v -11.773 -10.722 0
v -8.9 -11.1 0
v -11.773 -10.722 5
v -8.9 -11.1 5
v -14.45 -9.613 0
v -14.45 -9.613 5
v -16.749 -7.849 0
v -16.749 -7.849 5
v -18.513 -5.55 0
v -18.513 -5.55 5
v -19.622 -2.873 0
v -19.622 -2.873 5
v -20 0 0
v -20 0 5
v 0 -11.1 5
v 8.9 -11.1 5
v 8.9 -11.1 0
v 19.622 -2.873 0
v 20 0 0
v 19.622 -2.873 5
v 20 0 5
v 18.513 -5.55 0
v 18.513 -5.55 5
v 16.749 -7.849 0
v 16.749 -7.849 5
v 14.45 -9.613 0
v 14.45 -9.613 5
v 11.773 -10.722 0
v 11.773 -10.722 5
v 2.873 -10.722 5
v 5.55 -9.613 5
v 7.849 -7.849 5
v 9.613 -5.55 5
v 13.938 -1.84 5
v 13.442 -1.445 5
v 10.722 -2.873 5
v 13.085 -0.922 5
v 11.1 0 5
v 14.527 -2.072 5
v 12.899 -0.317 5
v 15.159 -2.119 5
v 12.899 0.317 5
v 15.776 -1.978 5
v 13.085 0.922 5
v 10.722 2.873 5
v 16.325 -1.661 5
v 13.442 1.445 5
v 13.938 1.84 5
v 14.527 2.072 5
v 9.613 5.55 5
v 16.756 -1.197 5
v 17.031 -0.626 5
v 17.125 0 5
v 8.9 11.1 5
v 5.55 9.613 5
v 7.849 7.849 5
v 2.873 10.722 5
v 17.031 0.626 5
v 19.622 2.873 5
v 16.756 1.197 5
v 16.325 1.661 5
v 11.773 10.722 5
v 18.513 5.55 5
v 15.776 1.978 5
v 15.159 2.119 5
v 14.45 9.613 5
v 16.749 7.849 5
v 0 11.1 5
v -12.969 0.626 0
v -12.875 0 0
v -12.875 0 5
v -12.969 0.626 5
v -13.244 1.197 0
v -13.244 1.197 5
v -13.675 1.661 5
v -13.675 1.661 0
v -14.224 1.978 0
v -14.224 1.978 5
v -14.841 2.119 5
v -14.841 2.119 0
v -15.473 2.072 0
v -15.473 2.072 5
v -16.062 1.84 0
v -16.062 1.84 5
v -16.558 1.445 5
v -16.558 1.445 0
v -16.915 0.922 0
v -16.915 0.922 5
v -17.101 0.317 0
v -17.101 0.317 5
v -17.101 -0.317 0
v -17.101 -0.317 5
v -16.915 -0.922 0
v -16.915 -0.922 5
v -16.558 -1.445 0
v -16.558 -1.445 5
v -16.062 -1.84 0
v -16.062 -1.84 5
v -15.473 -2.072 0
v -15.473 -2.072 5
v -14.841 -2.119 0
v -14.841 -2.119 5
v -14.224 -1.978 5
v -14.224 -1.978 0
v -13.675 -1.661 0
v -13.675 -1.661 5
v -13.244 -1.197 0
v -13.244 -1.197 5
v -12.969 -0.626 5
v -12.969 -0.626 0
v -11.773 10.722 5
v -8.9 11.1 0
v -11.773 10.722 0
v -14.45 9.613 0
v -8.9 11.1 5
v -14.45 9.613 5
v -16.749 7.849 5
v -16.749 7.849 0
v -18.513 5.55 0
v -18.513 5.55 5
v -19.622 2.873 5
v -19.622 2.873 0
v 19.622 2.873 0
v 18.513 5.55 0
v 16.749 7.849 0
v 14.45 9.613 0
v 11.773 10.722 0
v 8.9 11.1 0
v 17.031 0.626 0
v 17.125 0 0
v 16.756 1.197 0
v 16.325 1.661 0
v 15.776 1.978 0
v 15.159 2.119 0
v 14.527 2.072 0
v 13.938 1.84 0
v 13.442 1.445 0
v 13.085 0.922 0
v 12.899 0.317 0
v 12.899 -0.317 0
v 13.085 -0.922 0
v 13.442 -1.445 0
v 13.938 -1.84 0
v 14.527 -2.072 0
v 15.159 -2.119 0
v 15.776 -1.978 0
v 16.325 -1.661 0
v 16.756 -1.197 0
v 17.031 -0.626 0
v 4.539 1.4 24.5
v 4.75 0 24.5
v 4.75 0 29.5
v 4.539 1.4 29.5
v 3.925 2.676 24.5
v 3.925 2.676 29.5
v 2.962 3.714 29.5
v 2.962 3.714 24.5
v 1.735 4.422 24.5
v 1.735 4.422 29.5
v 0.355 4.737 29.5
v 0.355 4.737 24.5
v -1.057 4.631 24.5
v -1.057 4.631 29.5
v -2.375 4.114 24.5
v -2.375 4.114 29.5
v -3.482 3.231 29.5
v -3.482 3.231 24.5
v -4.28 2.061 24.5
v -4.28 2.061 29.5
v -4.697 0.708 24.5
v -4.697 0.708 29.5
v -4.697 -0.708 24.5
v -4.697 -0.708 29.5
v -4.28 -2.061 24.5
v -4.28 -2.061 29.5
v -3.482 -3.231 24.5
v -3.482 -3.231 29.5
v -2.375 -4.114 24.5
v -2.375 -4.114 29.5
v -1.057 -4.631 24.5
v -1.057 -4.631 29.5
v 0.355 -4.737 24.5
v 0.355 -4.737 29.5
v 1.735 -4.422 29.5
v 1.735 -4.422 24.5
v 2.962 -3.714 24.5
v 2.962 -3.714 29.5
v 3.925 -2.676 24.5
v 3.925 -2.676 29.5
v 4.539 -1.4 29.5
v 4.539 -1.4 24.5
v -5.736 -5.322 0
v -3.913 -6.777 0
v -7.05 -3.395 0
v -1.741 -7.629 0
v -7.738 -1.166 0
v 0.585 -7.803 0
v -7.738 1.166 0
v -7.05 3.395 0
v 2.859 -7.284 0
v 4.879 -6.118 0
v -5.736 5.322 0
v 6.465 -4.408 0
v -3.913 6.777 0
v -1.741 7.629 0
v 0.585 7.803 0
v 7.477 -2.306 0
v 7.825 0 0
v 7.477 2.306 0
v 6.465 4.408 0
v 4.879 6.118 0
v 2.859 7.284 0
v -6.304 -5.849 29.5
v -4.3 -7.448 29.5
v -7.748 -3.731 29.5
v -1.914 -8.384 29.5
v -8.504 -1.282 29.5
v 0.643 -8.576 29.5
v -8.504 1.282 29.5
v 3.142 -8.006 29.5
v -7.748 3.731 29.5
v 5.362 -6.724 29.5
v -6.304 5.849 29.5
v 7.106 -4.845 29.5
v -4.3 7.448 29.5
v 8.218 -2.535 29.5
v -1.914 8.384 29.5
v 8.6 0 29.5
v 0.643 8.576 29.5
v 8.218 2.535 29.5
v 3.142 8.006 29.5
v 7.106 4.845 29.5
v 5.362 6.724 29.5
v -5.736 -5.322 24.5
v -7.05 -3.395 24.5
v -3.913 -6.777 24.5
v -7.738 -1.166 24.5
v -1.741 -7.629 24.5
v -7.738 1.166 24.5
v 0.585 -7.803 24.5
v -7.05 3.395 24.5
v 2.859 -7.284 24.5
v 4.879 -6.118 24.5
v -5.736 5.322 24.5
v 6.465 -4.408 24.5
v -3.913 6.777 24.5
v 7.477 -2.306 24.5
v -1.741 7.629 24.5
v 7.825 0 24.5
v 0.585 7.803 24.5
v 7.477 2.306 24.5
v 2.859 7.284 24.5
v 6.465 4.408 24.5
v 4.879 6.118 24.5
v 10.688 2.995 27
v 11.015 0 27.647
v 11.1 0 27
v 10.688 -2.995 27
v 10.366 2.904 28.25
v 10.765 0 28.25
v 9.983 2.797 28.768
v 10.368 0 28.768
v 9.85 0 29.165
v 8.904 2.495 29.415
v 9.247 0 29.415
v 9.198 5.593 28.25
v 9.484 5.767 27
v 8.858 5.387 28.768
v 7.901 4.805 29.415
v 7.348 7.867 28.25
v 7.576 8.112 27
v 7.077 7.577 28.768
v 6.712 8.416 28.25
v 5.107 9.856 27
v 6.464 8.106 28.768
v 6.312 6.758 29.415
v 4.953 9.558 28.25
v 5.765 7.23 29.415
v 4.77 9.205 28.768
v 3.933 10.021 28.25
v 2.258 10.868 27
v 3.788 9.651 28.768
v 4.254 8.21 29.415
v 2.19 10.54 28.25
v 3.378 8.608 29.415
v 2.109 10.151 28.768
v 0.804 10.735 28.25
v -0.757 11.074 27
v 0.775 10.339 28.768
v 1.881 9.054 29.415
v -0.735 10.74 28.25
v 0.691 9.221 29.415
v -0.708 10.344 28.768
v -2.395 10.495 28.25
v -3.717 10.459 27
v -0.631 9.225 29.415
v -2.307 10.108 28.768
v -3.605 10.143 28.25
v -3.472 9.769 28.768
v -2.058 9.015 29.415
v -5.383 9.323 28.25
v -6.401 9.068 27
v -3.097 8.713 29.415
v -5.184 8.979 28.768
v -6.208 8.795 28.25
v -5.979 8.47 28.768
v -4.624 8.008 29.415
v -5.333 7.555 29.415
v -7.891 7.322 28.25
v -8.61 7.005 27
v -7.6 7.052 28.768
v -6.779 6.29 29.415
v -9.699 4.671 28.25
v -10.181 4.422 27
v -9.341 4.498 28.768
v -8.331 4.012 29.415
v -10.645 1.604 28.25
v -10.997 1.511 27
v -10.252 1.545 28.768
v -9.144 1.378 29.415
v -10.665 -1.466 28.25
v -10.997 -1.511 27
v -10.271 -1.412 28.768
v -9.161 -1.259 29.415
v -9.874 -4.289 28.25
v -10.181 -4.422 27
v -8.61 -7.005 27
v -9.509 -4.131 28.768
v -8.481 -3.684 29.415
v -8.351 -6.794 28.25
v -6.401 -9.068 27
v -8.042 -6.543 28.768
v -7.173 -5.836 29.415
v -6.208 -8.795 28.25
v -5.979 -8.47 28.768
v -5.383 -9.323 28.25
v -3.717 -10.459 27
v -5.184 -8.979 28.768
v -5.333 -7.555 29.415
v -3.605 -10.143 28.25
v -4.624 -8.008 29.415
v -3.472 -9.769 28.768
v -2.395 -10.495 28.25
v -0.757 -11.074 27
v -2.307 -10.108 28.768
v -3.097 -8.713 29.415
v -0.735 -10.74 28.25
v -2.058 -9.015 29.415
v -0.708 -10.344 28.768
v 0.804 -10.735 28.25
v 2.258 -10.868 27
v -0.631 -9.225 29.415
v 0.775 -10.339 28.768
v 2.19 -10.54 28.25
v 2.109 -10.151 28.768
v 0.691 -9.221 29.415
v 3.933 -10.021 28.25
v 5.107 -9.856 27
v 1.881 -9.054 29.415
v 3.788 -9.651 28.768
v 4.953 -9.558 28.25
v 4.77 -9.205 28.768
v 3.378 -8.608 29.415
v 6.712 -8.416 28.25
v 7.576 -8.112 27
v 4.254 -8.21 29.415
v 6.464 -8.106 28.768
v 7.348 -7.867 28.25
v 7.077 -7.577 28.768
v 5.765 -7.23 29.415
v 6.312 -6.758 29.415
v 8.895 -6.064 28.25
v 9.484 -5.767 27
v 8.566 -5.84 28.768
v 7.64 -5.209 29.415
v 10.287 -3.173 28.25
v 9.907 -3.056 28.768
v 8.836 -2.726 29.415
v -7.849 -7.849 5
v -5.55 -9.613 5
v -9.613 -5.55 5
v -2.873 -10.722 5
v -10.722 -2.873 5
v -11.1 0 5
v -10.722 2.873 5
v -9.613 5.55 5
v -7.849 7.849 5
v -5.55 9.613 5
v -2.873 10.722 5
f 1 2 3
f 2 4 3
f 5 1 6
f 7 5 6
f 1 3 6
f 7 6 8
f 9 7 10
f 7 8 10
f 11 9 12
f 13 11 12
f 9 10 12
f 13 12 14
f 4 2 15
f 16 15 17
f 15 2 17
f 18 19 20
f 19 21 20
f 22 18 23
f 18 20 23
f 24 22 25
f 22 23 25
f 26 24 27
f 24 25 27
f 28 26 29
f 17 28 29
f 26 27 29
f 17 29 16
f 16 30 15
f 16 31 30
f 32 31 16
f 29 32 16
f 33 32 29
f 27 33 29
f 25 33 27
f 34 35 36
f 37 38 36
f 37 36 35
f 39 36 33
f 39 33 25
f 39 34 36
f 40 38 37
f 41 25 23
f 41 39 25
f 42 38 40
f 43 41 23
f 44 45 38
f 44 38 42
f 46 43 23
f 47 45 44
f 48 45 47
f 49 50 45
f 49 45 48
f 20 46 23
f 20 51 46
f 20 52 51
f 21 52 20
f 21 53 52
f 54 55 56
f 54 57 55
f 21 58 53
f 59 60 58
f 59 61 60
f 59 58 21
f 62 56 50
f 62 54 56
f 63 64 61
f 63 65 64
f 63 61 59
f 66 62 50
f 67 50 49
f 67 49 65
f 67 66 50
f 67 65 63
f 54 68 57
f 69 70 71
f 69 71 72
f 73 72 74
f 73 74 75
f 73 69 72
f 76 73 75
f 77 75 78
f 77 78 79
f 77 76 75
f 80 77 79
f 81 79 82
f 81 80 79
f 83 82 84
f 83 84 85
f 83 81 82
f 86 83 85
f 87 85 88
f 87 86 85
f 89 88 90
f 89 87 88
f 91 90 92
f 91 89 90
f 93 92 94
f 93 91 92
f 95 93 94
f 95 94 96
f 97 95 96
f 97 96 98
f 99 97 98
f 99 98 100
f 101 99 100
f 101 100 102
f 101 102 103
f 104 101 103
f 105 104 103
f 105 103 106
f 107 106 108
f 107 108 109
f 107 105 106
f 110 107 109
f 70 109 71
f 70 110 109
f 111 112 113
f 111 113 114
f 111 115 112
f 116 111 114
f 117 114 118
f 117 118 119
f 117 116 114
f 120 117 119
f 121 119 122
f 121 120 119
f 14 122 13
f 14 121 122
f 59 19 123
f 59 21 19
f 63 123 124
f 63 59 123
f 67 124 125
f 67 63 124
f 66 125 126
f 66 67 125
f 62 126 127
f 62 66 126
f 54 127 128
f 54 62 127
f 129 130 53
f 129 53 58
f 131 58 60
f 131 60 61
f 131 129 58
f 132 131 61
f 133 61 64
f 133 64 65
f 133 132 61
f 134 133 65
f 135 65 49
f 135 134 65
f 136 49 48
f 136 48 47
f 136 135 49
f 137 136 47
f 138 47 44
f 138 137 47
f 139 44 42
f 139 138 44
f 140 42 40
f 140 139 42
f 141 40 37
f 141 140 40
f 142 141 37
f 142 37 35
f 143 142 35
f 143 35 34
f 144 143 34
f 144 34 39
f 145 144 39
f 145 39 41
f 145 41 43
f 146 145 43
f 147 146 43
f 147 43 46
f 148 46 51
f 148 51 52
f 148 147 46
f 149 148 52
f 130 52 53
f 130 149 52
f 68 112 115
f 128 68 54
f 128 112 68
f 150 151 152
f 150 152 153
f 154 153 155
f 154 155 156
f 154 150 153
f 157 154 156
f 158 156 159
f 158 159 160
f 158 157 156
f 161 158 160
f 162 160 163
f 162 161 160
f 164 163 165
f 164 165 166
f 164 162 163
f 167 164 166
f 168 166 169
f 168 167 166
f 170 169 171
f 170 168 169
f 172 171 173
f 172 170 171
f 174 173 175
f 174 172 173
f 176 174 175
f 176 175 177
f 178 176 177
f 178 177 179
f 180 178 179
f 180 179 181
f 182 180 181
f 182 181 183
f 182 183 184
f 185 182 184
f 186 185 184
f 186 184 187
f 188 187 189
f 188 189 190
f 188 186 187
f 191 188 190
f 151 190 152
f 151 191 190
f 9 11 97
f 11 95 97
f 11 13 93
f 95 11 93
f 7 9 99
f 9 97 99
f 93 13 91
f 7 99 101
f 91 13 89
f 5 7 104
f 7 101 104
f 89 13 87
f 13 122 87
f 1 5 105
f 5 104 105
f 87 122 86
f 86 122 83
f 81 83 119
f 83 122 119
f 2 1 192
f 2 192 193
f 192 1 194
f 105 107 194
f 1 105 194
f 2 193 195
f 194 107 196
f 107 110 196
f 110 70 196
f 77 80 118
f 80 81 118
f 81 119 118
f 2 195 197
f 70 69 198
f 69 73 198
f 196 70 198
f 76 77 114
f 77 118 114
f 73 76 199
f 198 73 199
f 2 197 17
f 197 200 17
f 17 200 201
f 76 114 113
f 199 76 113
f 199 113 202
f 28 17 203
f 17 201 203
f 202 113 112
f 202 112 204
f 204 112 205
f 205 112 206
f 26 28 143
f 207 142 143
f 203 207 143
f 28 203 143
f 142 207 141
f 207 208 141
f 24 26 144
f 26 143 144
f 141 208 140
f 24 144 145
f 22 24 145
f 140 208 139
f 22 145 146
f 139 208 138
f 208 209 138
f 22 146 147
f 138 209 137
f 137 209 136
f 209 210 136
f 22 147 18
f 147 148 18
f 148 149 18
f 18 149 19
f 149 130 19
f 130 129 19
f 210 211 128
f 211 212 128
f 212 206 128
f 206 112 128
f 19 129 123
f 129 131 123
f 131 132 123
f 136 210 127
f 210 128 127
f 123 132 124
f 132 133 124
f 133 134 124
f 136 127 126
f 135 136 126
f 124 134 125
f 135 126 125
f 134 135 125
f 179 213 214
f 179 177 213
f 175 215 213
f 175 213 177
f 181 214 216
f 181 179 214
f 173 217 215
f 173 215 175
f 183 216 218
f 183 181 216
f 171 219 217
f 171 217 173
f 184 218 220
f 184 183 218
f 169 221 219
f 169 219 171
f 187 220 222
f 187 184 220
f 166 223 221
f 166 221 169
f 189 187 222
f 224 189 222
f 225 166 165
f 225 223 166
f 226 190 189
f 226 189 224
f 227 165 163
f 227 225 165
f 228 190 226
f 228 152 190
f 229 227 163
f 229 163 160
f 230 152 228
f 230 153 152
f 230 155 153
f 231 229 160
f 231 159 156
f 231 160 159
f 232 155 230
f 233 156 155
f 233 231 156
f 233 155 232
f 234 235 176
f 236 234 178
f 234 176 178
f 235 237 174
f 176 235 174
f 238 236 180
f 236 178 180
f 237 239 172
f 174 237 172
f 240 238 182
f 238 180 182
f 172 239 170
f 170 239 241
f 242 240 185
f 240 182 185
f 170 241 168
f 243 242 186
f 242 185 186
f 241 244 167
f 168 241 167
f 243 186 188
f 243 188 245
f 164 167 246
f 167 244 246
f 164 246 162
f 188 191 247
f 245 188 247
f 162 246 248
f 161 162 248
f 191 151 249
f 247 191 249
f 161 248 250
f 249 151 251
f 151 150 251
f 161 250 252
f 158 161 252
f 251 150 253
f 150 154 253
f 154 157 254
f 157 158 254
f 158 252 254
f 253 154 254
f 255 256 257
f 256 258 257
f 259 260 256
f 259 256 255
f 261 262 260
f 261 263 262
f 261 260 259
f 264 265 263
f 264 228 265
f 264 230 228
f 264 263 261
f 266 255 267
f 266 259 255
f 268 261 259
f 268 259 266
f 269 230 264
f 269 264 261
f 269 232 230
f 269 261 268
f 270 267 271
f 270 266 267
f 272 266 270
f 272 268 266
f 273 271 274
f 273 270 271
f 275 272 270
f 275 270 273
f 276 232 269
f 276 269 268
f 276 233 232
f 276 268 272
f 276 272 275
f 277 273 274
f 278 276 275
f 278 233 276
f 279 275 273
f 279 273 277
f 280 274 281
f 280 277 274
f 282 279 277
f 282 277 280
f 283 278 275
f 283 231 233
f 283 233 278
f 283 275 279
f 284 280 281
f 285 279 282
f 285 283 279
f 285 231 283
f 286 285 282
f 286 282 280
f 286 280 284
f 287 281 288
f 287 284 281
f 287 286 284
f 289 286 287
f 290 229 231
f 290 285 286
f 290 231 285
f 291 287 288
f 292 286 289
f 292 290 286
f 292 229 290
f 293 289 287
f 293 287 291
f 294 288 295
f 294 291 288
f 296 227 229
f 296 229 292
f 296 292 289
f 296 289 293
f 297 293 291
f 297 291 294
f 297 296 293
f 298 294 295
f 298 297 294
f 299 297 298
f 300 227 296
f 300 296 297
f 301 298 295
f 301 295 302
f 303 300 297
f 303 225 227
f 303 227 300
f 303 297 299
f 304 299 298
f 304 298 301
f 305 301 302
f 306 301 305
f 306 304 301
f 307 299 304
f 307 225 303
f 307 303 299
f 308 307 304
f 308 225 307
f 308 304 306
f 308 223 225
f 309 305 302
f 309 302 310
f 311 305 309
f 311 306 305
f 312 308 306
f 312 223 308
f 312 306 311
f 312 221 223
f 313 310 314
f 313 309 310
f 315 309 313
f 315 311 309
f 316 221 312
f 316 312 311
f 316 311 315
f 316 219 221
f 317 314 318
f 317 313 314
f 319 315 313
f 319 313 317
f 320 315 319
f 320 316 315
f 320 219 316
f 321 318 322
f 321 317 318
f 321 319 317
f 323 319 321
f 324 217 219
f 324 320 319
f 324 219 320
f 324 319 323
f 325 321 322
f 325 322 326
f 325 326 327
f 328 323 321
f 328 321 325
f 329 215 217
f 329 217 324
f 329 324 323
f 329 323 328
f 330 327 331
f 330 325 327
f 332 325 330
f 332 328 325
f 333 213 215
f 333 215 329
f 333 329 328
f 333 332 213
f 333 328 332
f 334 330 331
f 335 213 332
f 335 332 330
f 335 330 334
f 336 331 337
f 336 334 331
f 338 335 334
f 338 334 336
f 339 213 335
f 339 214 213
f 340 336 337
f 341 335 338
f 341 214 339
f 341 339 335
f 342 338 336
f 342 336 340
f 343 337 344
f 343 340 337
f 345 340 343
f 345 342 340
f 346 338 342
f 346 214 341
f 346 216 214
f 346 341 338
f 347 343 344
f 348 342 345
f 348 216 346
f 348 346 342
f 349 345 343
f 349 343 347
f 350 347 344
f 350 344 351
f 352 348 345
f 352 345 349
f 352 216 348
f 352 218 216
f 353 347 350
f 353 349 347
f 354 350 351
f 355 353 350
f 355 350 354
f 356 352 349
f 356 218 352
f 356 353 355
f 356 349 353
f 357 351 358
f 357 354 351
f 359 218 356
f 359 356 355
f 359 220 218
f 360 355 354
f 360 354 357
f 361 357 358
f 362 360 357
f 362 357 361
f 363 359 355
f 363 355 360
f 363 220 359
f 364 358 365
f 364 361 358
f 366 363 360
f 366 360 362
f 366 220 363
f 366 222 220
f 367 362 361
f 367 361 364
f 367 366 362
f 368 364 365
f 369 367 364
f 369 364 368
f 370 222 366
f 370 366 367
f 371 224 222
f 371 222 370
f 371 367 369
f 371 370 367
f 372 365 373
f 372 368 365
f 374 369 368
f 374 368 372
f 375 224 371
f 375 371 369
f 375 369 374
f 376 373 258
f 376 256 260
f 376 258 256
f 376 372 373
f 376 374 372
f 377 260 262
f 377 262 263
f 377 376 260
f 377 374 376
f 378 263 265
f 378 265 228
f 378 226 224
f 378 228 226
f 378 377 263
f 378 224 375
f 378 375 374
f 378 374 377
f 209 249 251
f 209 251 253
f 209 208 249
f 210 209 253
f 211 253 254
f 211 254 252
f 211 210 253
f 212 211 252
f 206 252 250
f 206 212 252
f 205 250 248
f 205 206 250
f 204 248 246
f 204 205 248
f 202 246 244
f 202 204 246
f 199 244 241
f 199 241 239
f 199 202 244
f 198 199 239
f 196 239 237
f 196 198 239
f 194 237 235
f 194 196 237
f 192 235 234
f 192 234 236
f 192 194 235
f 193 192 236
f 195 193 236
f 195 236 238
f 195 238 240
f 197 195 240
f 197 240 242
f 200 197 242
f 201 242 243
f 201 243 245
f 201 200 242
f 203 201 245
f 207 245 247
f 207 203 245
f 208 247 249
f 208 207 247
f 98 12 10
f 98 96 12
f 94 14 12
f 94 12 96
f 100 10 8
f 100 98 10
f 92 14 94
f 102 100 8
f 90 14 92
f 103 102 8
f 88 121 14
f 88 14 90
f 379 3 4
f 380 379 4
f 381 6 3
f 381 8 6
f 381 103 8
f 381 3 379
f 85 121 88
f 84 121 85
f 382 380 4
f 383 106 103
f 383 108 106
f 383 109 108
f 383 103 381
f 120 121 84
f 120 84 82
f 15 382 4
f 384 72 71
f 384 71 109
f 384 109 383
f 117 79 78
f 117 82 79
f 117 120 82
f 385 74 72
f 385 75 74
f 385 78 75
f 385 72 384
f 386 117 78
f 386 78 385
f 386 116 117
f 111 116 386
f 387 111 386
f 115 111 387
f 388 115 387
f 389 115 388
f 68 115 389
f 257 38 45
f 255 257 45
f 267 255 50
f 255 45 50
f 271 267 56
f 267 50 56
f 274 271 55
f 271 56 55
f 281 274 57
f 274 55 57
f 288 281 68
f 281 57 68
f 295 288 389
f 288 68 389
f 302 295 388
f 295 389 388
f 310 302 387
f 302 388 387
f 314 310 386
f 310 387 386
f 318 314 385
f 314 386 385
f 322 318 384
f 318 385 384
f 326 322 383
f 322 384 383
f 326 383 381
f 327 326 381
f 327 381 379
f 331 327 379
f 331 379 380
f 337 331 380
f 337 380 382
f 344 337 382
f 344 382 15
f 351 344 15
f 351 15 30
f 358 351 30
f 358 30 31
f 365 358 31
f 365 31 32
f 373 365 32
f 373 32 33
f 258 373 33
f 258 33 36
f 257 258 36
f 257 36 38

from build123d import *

# Parameters (mm, degrees)
F0_W     = 40
F0_H     = 22.2
F0_R     = 2.125
F0_R_2   = 7.825
F1_DEPTH = 5
F2_R     = 11.1
F2_R_2   = 7.825
F3_DEPTH = 19.5
F4_R     = 11.1
F4_R_2   = 4.75
F5_DEPTH = 5
F6_R     = 11.09999
F7_R     = 2.5


# Not quite as in the source:
# - a fillet or chamfer is up to 0.001 mm smaller than in the source, because OpenCascade refuses the exact size


with BuildPart() as f1:
    # F0 (on Top) → F1 (new body)
    with BuildSketch(Plane.XY):
        Rectangle(F0_W, F0_H)
        with Locations((-15, 0)):
            Circle(F0_R, mode=Mode.SUBTRACT)
        Circle(F0_R_2, mode=Mode.SUBTRACT)
        with Locations((15, 0)):
            Circle(F0_R, mode=Mode.SUBTRACT)
    extrude(amount=F1_DEPTH)

    # F2 (on face) → F3 (join)
    with BuildSketch(Plane.XY.offset(5)):
        Circle(F2_R)
        Circle(F2_R_2, mode=Mode.SUBTRACT)
    extrude(amount=F3_DEPTH)

    # F4 (on face) → F5 (join)
    with BuildSketch(Plane.XY.offset(24.5)):
        Circle(F4_R)
        Circle(F4_R_2, mode=Mode.SUBTRACT)
    extrude(amount=F5_DEPTH)

    # F6 (radius 11.1 in the source; OpenCascade refuses exactly that, so slightly less here)
    f6_edges = [f1.edges().sort_by_distance(p)[0] for p in [
        (-20, 11.1, 2.5),
        (-20, -11.1, 2.5),
        (20, -11.1, 2.5),
        (20, 11.1, 2.5),
    ]]
    fillet(f6_edges, radius=F6_R)

    # F7
    f7_edges = [f1.edges().sort_by_distance(p)[0] for p in [
        (-11.1, 0, 29.5),
    ]]
    fillet(f7_edges, radius=F7_R)


solid = f1.part
